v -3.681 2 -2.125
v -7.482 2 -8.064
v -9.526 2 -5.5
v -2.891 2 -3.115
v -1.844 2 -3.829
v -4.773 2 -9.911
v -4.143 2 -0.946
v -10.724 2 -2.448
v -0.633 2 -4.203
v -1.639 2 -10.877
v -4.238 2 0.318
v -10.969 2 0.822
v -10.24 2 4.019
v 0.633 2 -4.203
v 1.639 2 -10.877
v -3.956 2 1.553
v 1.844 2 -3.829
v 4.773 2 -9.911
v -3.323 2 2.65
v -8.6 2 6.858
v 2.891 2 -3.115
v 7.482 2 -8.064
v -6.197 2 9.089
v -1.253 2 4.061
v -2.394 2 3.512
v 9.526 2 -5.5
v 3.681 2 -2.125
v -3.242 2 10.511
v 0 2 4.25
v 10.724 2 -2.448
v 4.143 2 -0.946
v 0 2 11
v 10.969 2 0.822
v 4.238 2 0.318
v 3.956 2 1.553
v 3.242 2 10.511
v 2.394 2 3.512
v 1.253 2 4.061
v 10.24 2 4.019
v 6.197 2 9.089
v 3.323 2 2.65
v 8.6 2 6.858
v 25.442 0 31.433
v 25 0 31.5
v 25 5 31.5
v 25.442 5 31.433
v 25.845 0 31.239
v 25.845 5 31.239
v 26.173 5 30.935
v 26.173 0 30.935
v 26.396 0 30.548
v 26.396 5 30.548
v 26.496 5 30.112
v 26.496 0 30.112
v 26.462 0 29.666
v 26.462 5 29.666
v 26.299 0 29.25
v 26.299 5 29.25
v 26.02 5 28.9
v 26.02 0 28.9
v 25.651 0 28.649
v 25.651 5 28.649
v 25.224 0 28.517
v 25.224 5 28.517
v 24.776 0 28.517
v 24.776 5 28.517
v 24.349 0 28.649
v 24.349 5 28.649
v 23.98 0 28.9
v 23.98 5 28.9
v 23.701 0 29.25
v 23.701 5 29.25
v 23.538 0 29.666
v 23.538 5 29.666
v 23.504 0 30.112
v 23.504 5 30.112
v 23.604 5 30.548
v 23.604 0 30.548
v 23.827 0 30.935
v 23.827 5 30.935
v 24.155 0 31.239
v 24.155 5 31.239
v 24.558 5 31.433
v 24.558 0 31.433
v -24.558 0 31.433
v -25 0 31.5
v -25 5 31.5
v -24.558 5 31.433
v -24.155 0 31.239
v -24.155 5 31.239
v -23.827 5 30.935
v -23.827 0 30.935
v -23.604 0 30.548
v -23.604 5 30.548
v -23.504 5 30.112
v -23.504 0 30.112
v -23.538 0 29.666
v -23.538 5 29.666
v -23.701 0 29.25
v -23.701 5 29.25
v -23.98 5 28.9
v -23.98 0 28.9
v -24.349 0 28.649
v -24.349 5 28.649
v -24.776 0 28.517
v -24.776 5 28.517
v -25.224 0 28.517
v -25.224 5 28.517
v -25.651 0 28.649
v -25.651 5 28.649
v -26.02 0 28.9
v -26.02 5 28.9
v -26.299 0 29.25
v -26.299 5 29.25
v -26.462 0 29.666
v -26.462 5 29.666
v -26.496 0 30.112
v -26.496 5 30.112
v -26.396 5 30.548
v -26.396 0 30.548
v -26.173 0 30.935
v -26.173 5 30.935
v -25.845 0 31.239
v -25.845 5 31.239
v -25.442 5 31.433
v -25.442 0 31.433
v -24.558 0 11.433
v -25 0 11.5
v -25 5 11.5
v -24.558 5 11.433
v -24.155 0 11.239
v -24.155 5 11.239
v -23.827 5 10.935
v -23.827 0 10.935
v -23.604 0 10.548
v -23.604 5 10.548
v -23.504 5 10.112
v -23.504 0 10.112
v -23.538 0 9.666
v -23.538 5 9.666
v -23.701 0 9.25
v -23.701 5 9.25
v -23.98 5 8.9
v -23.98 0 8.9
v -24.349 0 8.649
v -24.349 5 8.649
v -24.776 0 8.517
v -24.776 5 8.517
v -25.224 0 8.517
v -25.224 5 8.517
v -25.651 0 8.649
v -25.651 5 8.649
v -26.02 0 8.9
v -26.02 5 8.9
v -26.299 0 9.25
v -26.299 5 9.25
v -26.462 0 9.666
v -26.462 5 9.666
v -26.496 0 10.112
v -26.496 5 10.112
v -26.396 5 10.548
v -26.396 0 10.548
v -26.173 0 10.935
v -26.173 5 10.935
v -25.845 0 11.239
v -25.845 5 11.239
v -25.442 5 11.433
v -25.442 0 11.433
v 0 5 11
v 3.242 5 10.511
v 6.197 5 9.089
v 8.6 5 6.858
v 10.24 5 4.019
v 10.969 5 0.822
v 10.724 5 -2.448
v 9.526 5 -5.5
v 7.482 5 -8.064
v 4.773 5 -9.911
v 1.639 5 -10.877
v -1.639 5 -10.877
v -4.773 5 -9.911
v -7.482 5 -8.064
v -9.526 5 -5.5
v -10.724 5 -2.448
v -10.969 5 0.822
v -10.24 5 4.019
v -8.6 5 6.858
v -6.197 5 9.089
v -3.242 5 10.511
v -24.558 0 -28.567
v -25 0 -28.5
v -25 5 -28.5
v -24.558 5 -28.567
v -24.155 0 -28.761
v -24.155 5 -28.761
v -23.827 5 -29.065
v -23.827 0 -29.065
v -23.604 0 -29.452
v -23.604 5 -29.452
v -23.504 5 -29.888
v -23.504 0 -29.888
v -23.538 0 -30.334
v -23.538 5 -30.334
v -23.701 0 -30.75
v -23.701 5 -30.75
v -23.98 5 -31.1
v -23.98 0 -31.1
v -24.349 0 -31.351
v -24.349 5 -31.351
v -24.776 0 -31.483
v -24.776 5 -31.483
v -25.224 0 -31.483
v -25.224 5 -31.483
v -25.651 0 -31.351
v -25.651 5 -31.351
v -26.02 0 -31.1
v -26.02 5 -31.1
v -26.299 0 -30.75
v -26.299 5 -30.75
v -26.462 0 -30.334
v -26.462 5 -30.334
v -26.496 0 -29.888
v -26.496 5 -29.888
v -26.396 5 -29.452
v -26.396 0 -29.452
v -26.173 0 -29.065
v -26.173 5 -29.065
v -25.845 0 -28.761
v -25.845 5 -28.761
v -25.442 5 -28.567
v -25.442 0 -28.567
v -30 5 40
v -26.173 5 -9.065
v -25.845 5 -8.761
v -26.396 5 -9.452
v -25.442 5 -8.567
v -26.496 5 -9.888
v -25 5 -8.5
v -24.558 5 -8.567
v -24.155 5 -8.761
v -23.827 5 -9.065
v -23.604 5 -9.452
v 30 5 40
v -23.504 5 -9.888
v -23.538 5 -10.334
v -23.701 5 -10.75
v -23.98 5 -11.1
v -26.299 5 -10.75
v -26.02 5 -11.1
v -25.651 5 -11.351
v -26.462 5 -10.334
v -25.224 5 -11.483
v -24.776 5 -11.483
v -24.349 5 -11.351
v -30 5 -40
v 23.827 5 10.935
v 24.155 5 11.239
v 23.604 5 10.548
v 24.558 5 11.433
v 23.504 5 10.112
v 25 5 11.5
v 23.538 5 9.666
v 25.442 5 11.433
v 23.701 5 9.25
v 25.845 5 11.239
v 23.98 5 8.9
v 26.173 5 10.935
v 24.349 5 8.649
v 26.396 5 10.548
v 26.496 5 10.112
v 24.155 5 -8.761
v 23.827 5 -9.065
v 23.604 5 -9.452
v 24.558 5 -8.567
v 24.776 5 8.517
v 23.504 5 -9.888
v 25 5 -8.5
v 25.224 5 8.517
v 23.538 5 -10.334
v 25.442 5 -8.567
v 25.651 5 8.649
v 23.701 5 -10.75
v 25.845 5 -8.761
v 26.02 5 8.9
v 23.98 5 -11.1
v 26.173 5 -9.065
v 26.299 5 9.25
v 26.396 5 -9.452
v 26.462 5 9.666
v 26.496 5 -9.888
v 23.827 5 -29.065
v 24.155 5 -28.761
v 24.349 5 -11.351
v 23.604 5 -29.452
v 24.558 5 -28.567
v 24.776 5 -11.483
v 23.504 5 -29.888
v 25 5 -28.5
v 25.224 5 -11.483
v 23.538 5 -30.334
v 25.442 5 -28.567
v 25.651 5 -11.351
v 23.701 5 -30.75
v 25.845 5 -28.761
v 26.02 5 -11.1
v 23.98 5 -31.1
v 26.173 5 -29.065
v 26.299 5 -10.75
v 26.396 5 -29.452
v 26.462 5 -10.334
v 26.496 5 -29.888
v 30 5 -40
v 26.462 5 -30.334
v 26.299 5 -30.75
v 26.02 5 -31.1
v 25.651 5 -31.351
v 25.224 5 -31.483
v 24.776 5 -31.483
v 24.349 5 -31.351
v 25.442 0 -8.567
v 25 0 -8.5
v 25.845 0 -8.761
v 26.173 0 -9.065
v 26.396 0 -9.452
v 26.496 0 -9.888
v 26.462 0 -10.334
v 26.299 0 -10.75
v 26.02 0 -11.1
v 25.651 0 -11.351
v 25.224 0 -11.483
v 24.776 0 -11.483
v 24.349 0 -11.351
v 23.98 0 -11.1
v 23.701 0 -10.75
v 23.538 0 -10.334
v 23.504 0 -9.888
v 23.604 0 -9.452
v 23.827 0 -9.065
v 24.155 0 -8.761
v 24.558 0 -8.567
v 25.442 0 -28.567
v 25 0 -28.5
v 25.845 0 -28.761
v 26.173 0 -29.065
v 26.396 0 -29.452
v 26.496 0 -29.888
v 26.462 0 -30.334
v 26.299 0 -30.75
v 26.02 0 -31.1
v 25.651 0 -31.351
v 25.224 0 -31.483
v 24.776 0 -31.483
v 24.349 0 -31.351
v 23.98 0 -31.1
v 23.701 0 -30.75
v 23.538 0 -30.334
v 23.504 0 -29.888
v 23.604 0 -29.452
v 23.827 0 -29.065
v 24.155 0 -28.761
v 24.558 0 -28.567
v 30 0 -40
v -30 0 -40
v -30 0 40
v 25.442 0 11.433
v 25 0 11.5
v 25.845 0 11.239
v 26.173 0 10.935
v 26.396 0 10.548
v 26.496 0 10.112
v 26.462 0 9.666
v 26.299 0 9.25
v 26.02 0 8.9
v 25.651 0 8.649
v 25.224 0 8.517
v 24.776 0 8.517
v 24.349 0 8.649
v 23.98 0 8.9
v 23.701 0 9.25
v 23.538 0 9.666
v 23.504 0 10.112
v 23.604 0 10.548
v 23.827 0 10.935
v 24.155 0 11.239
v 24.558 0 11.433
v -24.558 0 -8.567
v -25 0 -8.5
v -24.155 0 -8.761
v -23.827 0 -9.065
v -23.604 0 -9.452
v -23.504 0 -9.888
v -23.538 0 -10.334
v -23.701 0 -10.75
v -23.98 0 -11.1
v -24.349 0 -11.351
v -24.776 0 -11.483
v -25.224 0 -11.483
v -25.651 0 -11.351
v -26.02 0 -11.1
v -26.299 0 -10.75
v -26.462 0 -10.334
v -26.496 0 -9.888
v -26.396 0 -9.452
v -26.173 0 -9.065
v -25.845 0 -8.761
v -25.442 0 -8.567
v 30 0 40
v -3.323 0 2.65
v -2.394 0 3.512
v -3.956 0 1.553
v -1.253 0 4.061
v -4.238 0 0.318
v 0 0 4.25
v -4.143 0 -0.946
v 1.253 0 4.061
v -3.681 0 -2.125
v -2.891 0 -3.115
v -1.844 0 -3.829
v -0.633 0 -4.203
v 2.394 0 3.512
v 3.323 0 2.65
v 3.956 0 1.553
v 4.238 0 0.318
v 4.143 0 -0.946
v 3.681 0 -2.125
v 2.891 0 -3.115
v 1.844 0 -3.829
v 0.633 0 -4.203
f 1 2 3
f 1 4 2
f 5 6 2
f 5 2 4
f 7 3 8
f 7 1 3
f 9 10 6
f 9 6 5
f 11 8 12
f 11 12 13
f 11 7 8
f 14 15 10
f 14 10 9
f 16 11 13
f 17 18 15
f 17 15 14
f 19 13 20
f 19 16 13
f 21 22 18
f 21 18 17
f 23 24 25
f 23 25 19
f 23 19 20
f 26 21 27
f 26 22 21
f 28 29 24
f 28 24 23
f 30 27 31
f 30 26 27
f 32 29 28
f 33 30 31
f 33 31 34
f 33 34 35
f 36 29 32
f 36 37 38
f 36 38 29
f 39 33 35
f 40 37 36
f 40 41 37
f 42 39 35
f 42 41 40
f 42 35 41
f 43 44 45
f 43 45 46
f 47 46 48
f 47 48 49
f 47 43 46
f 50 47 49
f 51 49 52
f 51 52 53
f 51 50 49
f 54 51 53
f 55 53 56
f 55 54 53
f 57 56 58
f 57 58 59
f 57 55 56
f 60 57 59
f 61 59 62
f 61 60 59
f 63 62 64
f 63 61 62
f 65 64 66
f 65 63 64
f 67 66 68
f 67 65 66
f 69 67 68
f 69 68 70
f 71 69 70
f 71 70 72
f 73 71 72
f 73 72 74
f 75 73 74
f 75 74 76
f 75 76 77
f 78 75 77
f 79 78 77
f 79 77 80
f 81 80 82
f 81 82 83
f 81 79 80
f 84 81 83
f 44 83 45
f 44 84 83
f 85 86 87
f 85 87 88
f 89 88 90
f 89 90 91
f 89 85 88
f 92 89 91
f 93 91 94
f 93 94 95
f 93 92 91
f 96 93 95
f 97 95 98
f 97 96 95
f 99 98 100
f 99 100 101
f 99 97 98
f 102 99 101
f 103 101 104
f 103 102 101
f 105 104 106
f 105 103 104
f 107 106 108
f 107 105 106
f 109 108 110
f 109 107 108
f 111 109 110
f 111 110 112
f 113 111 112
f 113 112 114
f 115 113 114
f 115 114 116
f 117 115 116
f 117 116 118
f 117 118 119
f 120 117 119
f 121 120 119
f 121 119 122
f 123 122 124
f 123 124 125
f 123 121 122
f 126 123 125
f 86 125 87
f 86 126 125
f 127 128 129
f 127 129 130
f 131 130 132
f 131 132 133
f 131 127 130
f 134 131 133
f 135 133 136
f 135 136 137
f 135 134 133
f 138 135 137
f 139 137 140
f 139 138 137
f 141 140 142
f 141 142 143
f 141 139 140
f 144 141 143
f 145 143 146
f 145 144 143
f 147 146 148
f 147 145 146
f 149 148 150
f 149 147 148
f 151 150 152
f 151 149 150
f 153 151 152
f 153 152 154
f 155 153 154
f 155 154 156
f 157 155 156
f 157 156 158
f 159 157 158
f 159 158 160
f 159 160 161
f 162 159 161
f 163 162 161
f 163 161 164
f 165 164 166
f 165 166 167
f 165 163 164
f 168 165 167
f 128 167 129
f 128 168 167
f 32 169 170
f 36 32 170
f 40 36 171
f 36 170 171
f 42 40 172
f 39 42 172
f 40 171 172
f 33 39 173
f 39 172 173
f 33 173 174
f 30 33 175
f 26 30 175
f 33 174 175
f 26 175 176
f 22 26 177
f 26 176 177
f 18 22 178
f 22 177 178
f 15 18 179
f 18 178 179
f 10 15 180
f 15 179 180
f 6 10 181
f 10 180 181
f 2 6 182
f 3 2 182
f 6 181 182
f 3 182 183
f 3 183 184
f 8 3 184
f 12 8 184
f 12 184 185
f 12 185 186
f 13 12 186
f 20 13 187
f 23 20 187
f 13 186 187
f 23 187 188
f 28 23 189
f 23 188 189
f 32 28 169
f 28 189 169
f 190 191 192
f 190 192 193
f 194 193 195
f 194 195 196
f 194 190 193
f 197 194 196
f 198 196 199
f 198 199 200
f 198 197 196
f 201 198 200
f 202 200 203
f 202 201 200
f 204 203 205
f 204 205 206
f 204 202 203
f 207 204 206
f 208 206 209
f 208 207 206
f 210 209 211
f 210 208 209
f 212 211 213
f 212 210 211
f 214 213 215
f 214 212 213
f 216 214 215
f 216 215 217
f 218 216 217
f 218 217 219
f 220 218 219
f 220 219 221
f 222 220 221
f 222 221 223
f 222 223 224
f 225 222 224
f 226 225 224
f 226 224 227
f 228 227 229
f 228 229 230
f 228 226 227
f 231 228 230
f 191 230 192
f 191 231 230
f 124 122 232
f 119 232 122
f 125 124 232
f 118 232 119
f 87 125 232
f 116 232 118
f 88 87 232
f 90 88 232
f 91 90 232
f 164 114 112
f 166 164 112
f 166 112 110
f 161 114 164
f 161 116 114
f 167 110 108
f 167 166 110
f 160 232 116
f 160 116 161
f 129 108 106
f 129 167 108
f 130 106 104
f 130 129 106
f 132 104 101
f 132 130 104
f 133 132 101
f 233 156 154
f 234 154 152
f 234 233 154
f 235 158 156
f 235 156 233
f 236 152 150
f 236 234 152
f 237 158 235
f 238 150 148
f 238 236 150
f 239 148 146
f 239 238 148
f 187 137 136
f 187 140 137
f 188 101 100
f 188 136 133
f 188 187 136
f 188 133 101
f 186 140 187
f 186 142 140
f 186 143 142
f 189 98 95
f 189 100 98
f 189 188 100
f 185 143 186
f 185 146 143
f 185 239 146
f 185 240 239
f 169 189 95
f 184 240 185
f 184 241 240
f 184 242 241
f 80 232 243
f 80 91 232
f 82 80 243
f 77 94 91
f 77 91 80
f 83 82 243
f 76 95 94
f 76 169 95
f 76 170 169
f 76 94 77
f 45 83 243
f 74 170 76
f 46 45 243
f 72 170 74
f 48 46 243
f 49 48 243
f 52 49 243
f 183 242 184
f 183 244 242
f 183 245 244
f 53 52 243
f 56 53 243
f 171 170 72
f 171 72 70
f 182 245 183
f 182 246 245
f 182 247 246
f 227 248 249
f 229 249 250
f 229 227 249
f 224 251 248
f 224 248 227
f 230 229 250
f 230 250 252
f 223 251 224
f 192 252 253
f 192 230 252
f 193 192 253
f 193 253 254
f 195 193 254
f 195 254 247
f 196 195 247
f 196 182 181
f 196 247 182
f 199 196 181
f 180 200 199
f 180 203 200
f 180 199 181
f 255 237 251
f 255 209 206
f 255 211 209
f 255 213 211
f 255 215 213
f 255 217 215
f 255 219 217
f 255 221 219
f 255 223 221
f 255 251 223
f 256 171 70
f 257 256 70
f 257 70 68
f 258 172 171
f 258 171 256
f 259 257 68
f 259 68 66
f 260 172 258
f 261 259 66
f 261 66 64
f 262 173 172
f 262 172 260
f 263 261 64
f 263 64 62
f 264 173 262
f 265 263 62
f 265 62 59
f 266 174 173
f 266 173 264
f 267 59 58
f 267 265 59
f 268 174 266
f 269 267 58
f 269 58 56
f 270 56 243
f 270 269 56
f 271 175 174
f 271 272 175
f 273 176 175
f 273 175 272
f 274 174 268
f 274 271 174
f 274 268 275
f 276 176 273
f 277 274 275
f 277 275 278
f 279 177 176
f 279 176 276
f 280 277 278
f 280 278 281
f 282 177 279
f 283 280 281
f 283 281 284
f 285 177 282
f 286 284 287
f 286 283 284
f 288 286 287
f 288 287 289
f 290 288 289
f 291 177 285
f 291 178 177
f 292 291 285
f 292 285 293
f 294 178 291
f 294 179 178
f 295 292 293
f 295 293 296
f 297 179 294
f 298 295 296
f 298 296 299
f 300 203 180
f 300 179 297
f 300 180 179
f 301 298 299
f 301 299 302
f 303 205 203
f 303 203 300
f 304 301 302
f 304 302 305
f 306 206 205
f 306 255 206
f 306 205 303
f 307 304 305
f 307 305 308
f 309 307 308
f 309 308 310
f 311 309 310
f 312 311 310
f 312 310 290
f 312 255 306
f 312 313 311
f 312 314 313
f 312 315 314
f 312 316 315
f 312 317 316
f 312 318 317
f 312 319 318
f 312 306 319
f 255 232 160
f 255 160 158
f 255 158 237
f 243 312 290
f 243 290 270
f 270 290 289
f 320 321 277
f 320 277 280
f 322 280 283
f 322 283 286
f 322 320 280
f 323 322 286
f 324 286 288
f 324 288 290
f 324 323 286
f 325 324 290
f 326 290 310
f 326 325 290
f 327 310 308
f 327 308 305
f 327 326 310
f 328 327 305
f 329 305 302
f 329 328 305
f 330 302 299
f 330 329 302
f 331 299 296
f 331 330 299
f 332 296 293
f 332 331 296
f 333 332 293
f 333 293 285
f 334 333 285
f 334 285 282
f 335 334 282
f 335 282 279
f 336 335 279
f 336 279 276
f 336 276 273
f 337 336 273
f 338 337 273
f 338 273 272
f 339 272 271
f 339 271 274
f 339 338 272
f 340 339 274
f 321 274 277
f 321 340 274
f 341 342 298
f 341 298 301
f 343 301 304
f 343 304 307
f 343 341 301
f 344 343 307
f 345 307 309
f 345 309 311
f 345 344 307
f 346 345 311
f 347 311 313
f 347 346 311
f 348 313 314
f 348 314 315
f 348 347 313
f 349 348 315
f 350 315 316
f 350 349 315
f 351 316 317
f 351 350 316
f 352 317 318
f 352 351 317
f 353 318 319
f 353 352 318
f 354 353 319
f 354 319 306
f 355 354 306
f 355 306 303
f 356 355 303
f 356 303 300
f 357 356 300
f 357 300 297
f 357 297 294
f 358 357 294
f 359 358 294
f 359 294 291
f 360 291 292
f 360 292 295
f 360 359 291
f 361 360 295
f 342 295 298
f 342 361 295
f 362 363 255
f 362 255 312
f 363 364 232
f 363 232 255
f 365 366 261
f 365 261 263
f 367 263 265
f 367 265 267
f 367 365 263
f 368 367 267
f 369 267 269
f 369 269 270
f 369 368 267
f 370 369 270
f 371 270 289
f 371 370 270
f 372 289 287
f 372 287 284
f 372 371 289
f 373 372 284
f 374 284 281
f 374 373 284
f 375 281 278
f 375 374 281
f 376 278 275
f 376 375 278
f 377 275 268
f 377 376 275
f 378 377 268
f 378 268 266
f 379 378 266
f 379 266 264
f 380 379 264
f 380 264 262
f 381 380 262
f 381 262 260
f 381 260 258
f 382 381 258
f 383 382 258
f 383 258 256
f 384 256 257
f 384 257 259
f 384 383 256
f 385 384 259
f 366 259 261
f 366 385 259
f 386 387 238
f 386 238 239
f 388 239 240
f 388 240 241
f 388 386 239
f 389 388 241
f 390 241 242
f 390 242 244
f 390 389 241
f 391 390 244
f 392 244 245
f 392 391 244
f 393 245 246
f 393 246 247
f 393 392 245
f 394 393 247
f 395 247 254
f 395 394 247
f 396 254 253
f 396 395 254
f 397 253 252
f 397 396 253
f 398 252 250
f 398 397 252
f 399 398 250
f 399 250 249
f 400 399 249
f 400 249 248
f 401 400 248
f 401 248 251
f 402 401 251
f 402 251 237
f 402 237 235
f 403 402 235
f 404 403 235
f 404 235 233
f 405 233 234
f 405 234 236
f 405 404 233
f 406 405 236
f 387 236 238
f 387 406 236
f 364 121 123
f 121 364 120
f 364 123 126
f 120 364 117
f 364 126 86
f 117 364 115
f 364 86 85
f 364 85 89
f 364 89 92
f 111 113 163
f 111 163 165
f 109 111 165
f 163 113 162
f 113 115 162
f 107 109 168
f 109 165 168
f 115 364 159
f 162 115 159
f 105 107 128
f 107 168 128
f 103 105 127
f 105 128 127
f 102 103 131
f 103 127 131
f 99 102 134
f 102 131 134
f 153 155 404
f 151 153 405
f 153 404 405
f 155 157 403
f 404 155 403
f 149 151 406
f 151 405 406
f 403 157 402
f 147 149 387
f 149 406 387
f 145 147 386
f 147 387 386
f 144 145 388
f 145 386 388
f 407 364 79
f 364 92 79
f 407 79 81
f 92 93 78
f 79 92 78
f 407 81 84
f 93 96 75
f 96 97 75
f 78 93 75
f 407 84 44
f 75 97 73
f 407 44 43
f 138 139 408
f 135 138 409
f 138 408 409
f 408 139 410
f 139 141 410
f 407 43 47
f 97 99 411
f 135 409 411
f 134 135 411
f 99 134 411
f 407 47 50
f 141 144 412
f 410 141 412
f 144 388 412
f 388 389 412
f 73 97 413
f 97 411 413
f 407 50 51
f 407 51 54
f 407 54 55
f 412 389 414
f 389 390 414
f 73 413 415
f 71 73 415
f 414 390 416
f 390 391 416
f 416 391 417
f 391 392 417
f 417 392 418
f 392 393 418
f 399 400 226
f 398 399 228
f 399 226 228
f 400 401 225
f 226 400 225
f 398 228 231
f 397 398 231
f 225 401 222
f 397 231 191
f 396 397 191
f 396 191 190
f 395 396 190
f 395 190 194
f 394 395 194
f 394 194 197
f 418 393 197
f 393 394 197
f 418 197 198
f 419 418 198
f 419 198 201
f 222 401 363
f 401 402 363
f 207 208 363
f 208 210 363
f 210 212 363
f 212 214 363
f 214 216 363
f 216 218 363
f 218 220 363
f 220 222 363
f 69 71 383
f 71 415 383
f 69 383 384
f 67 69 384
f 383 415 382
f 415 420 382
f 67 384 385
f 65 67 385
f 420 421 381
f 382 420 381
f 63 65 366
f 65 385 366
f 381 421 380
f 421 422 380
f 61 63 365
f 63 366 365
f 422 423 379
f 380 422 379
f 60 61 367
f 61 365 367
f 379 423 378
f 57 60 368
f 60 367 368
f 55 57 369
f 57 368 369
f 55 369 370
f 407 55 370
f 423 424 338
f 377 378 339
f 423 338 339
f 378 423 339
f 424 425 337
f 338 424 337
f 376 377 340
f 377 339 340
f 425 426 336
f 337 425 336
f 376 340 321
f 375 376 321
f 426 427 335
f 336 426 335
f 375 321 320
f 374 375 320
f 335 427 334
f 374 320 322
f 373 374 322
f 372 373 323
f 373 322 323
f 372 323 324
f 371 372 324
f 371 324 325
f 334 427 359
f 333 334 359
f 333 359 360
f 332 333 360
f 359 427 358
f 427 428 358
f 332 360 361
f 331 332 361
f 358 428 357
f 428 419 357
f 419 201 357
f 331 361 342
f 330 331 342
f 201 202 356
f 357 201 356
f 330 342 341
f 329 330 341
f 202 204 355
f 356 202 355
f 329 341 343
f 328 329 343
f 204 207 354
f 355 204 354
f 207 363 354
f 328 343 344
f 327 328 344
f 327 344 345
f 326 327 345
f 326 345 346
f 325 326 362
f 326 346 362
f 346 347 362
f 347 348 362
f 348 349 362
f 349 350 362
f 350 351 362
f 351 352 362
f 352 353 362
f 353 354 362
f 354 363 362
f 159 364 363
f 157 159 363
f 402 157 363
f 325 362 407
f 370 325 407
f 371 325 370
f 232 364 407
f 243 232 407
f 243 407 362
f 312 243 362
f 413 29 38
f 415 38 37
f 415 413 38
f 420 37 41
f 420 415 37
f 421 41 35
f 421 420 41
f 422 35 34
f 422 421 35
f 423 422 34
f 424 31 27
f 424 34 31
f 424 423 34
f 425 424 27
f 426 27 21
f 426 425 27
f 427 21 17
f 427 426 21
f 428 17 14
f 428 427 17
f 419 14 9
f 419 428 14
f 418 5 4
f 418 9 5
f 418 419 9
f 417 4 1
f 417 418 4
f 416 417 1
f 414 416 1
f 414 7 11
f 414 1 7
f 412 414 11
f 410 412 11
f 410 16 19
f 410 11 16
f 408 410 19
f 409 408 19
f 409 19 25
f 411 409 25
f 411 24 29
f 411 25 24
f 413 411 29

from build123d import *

# Parameters (mm, degrees)
SKETCH1_W           = 60
SKETCH1_H           = 80
SKETCH1_R           = 1.5
SKETCH1_R_2         = 4.25
BOSS_EXTRUDE1_DEPTH = 5
SKETCH2_R           = 11
CUT_EXTRUDE1_DEPTH  = 3


with BuildPart() as part:
    # Sketch1 → Boss-Extrude1 (new body)
    with BuildSketch(Plane(origin=(0, 0, 0), x_dir=(1, 0, 0), z_dir=(0, 1, 0))):
        Rectangle(SKETCH1_W, SKETCH1_H)
        with Locations(Location((-25, 30, 0), (0, 0, 270))):
            Circle(SKETCH1_R, mode=Mode.SUBTRACT)
        with Locations(Location((25, 30, 0), (0, 0, 270))):
            Circle(SKETCH1_R, mode=Mode.SUBTRACT)
        with Locations(Location((25, 10, 0), (0, 0, 270))):
            Circle(SKETCH1_R, mode=Mode.SUBTRACT)
        with Locations(Location((25, -10, 0), (0, 0, 270))):
            Circle(SKETCH1_R, mode=Mode.SUBTRACT)
        with Locations(Location((25, -30, 0), (0, 0, 270))):
            Circle(SKETCH1_R, mode=Mode.SUBTRACT)
        with Locations(Location((-25, 10, 0), (0, 0, 270))):
            Circle(SKETCH1_R, mode=Mode.SUBTRACT)
        with Locations(Location((-25, -10, 0), (0, 0, 270))):
            Circle(SKETCH1_R, mode=Mode.SUBTRACT)
        with Locations(Location((-25, -30, 0), (0, 0, 270))):
            Circle(SKETCH1_R, mode=Mode.SUBTRACT)
        with Locations(Location((0, 0, 0), (0, 0, 270))):
            Circle(SKETCH1_R_2, mode=Mode.SUBTRACT)
    extrude(amount=BOSS_EXTRUDE1_DEPTH)

    # Sketch2 → Cut-Extrude1 (cut)
    with BuildSketch(Plane(origin=(0, 5, 0), x_dir=(1, 0, 0), z_dir=(0, 1, 0))):
        with Locations(Location((0, 0, 0), (0, 0, 270))):
            Circle(SKETCH2_R)
    extrude(amount=-CUT_EXTRUDE1_DEPTH, mode=Mode.SUBTRACT)


solid = part.part
